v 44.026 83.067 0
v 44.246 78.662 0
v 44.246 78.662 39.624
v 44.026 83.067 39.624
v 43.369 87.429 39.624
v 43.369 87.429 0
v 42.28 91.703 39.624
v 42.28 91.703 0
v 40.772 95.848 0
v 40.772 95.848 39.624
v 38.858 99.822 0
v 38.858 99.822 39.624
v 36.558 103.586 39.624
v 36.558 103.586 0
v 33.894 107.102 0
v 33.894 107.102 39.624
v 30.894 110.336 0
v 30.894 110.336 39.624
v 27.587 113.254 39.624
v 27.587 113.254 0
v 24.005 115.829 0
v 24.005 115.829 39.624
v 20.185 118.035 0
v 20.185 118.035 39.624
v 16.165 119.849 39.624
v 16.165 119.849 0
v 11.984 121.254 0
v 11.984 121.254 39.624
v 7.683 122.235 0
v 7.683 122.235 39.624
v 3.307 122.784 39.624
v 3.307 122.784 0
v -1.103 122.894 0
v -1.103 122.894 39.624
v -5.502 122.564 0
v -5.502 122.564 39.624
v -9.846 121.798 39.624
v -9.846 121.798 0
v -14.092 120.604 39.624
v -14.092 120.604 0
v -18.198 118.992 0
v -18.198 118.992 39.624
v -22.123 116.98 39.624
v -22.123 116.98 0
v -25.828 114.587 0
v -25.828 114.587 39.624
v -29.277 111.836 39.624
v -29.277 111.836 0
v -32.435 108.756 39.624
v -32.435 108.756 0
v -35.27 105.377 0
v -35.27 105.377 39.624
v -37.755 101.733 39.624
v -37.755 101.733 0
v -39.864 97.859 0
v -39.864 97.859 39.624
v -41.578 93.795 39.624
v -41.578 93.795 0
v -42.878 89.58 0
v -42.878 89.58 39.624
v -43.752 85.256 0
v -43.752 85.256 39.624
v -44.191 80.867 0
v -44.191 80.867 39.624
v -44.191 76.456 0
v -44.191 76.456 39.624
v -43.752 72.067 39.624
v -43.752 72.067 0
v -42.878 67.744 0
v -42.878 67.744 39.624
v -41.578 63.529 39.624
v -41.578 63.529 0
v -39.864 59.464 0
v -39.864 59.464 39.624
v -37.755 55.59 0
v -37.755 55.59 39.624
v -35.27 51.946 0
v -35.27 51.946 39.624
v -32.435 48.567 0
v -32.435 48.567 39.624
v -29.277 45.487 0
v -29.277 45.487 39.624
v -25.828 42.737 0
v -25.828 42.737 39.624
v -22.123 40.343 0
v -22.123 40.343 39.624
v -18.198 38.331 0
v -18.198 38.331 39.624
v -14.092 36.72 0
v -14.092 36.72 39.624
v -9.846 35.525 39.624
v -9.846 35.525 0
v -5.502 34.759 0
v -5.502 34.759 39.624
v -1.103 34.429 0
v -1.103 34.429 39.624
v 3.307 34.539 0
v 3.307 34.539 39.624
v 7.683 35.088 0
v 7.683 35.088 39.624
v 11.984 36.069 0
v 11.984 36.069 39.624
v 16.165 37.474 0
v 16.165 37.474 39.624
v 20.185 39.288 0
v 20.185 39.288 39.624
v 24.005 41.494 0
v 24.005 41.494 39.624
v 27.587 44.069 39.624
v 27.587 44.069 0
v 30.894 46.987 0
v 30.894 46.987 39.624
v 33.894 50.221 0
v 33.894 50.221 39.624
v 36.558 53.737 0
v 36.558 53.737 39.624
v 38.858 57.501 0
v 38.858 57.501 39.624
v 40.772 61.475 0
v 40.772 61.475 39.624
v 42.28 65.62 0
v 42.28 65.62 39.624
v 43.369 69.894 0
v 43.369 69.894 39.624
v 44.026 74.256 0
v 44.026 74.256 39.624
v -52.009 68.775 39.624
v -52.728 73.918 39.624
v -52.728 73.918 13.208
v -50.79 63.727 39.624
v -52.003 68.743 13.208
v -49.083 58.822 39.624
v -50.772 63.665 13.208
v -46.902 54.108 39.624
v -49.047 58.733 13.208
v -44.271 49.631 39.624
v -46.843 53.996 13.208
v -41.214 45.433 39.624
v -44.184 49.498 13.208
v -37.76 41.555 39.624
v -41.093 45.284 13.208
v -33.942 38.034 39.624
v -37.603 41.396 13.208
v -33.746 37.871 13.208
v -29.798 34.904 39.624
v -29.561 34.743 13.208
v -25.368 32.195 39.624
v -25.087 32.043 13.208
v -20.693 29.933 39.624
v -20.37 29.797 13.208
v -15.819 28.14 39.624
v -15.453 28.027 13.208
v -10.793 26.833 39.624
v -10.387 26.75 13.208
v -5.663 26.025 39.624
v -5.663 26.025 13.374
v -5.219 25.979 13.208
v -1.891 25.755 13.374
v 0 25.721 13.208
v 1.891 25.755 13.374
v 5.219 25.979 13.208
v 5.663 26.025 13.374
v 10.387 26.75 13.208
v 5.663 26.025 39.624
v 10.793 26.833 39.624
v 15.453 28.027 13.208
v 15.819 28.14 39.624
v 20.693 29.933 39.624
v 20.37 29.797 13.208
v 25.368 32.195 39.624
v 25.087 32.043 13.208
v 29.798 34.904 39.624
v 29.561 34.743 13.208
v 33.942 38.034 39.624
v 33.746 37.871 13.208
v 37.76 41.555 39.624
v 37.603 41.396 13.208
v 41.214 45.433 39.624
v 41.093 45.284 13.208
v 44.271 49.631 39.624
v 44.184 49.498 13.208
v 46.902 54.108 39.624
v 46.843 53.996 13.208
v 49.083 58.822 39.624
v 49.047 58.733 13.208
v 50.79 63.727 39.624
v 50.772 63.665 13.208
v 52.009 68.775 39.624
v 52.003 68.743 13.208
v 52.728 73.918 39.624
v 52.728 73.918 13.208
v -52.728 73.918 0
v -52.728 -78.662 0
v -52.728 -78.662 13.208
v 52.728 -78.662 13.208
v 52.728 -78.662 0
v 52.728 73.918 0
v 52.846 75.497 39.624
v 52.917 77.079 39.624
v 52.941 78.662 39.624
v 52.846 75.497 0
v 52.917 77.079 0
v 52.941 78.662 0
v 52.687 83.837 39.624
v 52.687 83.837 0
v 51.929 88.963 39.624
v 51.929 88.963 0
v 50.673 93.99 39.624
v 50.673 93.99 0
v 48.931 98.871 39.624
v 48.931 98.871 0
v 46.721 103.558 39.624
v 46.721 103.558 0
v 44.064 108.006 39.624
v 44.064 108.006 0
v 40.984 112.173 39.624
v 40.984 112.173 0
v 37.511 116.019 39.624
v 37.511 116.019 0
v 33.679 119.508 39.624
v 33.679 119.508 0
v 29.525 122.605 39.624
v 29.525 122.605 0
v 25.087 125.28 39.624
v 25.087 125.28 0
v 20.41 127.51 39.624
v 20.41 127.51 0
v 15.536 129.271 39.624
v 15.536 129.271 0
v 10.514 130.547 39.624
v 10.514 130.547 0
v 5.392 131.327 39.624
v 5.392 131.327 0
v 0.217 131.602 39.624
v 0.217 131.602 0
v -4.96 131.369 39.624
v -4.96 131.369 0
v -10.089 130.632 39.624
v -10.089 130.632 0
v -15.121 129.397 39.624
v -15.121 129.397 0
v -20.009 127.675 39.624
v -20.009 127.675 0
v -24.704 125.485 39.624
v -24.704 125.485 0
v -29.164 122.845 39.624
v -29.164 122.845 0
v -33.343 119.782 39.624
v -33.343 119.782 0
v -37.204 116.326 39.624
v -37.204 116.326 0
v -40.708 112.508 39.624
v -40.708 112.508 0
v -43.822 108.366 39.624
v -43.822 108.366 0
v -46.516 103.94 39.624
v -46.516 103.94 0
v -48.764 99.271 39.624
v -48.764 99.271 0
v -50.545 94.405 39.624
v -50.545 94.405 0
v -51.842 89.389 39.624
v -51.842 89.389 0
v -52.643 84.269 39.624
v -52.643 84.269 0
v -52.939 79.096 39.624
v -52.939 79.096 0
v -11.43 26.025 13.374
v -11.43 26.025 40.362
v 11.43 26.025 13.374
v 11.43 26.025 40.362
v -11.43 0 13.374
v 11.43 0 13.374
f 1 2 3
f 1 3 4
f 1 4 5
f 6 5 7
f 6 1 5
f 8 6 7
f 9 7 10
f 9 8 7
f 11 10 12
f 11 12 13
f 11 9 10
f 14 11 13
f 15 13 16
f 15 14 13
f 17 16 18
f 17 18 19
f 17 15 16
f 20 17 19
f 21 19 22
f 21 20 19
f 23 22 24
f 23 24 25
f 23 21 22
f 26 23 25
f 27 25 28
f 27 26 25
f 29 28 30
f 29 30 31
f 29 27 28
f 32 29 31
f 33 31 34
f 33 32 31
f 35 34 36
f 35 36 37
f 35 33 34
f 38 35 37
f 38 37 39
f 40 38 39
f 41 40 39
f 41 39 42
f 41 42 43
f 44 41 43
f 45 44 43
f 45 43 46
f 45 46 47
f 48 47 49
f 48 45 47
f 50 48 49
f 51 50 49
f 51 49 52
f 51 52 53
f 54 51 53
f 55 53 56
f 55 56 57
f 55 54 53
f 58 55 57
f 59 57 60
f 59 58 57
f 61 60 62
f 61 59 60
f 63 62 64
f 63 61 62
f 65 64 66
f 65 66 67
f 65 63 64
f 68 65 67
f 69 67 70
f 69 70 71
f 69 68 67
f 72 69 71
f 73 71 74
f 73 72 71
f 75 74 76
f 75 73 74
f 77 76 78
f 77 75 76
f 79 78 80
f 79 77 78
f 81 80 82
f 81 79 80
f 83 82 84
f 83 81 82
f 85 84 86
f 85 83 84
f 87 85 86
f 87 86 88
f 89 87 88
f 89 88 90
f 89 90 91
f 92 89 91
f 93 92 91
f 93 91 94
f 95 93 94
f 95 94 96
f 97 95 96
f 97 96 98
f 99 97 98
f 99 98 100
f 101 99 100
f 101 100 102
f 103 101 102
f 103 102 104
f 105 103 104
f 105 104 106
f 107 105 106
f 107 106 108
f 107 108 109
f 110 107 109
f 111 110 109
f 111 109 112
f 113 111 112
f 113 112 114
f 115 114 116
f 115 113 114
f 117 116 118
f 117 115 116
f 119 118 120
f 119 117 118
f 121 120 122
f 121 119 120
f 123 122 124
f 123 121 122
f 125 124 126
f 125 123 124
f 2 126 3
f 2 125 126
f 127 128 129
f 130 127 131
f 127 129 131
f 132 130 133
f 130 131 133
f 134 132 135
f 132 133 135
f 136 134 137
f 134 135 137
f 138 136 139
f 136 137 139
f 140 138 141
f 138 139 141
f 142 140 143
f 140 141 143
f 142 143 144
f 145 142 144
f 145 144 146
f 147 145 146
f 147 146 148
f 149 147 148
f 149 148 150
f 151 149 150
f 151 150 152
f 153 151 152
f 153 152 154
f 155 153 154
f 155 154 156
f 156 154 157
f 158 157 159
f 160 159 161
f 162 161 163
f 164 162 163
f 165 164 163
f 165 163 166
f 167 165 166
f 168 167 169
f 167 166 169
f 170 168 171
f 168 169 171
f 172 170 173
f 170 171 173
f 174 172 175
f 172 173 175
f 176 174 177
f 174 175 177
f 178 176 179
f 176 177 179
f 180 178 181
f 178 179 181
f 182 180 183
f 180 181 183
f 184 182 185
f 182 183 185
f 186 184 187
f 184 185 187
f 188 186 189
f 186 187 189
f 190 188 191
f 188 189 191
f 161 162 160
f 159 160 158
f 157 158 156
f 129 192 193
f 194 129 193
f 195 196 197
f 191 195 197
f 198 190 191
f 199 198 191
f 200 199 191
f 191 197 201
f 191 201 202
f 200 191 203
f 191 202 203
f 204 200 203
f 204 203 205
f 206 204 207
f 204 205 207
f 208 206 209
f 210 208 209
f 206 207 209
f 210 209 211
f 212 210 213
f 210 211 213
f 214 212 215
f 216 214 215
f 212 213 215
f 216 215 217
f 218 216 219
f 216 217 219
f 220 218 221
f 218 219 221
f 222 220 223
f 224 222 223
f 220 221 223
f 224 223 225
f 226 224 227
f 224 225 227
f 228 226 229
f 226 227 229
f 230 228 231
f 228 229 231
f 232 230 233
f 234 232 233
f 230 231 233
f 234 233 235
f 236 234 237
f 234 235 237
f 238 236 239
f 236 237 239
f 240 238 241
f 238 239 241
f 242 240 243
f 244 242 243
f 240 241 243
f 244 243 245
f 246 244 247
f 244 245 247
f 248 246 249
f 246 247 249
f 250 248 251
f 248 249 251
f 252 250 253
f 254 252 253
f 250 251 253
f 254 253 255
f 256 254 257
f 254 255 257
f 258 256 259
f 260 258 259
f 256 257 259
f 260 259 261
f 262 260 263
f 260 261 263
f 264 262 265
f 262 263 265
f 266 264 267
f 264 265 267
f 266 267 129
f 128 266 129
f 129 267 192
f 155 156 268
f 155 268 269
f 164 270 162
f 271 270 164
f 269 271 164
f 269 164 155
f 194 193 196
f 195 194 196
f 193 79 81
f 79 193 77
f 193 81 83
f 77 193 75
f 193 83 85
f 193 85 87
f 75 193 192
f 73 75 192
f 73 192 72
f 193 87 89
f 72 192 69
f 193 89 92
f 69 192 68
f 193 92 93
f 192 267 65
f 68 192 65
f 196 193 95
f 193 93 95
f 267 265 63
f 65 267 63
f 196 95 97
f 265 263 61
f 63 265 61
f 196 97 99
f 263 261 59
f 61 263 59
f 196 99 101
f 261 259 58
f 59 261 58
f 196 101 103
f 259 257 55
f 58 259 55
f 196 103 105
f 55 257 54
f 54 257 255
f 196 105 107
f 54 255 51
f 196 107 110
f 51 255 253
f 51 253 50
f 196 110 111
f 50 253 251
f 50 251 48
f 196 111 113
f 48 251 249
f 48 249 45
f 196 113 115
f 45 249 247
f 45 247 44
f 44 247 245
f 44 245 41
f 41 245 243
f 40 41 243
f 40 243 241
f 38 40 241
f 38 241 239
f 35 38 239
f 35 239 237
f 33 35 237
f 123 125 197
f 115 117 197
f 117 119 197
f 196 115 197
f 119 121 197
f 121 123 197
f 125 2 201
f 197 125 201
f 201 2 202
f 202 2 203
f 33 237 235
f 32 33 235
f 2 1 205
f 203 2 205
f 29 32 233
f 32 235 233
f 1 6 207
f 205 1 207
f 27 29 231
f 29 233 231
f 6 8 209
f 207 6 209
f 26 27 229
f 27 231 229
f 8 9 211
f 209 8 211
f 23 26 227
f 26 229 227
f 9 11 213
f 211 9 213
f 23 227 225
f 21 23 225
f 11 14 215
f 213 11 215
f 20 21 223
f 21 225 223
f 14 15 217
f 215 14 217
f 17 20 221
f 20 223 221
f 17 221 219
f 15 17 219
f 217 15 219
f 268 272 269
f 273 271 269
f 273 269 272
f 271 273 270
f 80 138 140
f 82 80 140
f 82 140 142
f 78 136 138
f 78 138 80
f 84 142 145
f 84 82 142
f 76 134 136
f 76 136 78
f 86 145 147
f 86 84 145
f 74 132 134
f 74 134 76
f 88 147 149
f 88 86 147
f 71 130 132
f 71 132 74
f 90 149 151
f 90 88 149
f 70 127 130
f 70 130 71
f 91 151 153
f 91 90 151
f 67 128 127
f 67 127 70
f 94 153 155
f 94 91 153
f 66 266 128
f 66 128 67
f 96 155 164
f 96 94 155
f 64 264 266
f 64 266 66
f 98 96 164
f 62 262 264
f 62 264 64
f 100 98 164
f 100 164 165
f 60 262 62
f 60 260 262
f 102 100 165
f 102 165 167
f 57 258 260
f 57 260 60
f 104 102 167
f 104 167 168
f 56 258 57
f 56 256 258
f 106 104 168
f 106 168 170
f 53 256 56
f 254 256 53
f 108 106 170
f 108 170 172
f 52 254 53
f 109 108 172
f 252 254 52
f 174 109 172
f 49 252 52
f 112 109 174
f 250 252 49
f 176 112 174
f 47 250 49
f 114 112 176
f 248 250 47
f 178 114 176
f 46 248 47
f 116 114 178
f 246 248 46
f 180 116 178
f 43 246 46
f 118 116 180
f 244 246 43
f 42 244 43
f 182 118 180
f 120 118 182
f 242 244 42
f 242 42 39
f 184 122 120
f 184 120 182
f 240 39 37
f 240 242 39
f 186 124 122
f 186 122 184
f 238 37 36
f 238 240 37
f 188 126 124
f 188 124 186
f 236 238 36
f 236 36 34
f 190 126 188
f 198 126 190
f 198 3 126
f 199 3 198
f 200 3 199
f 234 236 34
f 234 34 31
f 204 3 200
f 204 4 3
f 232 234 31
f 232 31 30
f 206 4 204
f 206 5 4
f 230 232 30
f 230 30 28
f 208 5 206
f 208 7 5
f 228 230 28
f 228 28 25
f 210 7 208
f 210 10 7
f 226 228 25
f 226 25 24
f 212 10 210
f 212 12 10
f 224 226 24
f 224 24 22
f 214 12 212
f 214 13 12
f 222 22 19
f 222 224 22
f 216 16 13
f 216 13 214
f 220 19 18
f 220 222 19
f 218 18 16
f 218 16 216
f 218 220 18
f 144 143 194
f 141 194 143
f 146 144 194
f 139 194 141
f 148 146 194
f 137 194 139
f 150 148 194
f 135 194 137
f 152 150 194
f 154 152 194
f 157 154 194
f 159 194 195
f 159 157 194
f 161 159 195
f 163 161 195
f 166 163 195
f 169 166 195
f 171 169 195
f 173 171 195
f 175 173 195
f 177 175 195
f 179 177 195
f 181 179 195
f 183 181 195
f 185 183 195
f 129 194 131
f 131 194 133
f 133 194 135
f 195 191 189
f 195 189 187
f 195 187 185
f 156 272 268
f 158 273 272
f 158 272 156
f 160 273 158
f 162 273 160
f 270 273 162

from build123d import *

# Parameters (mm, degrees)
F0_R     = 44.245933
F1_DEPTH = 39.624
F2_DEPTH = 13.208
F4_DEPTH = 11.43


with BuildPart() as f1:
    # F0 (on Top) → F1 (new body)
    with BuildSketch(Plane.XY):
        with BuildLine():
            ThreePointArc((52.940541, 78.661576), (-2.374099, 131.548857), (-52.72761, 73.918154))
            ThreePointArc((-52.72761, 73.918154), (0, 25.721035), (52.72761, 73.918154))
            ThreePointArc((52.72761, 73.918154), (52.887282, 76.287477), (52.940541, 78.661576))
        make_face()
        with Locations((0, 78.661576)):
            Circle(F0_R, mode=Mode.SUBTRACT)
    extrude(amount=F1_DEPTH)

    # F0 (on Top) → F2 (join)
    with BuildSketch(Plane.XY):
        with BuildLine():
            Line((-52.72761, 73.918154), (-52.72761, -78.661576))
            Line((-52.72761, -78.661576), (52.72761, -78.661576))
            Line((52.72761, -78.661576), (52.72761, 73.918154))
            ThreePointArc((52.72761, 73.918154), (0, 25.721035), (-52.72761, 73.918154))
        make_face()
    extrude(amount=F2_DEPTH)

    # F3 (on Right) → F4 (join, symmetric)
    with BuildSketch(Plane.YZ):
        Polygon((26.024748, 13.373829), (26.024748, 40.362455), (0, 13.373829), align=None)
    extrude(amount=F4_DEPTH, both=True)


solid = f1.part
